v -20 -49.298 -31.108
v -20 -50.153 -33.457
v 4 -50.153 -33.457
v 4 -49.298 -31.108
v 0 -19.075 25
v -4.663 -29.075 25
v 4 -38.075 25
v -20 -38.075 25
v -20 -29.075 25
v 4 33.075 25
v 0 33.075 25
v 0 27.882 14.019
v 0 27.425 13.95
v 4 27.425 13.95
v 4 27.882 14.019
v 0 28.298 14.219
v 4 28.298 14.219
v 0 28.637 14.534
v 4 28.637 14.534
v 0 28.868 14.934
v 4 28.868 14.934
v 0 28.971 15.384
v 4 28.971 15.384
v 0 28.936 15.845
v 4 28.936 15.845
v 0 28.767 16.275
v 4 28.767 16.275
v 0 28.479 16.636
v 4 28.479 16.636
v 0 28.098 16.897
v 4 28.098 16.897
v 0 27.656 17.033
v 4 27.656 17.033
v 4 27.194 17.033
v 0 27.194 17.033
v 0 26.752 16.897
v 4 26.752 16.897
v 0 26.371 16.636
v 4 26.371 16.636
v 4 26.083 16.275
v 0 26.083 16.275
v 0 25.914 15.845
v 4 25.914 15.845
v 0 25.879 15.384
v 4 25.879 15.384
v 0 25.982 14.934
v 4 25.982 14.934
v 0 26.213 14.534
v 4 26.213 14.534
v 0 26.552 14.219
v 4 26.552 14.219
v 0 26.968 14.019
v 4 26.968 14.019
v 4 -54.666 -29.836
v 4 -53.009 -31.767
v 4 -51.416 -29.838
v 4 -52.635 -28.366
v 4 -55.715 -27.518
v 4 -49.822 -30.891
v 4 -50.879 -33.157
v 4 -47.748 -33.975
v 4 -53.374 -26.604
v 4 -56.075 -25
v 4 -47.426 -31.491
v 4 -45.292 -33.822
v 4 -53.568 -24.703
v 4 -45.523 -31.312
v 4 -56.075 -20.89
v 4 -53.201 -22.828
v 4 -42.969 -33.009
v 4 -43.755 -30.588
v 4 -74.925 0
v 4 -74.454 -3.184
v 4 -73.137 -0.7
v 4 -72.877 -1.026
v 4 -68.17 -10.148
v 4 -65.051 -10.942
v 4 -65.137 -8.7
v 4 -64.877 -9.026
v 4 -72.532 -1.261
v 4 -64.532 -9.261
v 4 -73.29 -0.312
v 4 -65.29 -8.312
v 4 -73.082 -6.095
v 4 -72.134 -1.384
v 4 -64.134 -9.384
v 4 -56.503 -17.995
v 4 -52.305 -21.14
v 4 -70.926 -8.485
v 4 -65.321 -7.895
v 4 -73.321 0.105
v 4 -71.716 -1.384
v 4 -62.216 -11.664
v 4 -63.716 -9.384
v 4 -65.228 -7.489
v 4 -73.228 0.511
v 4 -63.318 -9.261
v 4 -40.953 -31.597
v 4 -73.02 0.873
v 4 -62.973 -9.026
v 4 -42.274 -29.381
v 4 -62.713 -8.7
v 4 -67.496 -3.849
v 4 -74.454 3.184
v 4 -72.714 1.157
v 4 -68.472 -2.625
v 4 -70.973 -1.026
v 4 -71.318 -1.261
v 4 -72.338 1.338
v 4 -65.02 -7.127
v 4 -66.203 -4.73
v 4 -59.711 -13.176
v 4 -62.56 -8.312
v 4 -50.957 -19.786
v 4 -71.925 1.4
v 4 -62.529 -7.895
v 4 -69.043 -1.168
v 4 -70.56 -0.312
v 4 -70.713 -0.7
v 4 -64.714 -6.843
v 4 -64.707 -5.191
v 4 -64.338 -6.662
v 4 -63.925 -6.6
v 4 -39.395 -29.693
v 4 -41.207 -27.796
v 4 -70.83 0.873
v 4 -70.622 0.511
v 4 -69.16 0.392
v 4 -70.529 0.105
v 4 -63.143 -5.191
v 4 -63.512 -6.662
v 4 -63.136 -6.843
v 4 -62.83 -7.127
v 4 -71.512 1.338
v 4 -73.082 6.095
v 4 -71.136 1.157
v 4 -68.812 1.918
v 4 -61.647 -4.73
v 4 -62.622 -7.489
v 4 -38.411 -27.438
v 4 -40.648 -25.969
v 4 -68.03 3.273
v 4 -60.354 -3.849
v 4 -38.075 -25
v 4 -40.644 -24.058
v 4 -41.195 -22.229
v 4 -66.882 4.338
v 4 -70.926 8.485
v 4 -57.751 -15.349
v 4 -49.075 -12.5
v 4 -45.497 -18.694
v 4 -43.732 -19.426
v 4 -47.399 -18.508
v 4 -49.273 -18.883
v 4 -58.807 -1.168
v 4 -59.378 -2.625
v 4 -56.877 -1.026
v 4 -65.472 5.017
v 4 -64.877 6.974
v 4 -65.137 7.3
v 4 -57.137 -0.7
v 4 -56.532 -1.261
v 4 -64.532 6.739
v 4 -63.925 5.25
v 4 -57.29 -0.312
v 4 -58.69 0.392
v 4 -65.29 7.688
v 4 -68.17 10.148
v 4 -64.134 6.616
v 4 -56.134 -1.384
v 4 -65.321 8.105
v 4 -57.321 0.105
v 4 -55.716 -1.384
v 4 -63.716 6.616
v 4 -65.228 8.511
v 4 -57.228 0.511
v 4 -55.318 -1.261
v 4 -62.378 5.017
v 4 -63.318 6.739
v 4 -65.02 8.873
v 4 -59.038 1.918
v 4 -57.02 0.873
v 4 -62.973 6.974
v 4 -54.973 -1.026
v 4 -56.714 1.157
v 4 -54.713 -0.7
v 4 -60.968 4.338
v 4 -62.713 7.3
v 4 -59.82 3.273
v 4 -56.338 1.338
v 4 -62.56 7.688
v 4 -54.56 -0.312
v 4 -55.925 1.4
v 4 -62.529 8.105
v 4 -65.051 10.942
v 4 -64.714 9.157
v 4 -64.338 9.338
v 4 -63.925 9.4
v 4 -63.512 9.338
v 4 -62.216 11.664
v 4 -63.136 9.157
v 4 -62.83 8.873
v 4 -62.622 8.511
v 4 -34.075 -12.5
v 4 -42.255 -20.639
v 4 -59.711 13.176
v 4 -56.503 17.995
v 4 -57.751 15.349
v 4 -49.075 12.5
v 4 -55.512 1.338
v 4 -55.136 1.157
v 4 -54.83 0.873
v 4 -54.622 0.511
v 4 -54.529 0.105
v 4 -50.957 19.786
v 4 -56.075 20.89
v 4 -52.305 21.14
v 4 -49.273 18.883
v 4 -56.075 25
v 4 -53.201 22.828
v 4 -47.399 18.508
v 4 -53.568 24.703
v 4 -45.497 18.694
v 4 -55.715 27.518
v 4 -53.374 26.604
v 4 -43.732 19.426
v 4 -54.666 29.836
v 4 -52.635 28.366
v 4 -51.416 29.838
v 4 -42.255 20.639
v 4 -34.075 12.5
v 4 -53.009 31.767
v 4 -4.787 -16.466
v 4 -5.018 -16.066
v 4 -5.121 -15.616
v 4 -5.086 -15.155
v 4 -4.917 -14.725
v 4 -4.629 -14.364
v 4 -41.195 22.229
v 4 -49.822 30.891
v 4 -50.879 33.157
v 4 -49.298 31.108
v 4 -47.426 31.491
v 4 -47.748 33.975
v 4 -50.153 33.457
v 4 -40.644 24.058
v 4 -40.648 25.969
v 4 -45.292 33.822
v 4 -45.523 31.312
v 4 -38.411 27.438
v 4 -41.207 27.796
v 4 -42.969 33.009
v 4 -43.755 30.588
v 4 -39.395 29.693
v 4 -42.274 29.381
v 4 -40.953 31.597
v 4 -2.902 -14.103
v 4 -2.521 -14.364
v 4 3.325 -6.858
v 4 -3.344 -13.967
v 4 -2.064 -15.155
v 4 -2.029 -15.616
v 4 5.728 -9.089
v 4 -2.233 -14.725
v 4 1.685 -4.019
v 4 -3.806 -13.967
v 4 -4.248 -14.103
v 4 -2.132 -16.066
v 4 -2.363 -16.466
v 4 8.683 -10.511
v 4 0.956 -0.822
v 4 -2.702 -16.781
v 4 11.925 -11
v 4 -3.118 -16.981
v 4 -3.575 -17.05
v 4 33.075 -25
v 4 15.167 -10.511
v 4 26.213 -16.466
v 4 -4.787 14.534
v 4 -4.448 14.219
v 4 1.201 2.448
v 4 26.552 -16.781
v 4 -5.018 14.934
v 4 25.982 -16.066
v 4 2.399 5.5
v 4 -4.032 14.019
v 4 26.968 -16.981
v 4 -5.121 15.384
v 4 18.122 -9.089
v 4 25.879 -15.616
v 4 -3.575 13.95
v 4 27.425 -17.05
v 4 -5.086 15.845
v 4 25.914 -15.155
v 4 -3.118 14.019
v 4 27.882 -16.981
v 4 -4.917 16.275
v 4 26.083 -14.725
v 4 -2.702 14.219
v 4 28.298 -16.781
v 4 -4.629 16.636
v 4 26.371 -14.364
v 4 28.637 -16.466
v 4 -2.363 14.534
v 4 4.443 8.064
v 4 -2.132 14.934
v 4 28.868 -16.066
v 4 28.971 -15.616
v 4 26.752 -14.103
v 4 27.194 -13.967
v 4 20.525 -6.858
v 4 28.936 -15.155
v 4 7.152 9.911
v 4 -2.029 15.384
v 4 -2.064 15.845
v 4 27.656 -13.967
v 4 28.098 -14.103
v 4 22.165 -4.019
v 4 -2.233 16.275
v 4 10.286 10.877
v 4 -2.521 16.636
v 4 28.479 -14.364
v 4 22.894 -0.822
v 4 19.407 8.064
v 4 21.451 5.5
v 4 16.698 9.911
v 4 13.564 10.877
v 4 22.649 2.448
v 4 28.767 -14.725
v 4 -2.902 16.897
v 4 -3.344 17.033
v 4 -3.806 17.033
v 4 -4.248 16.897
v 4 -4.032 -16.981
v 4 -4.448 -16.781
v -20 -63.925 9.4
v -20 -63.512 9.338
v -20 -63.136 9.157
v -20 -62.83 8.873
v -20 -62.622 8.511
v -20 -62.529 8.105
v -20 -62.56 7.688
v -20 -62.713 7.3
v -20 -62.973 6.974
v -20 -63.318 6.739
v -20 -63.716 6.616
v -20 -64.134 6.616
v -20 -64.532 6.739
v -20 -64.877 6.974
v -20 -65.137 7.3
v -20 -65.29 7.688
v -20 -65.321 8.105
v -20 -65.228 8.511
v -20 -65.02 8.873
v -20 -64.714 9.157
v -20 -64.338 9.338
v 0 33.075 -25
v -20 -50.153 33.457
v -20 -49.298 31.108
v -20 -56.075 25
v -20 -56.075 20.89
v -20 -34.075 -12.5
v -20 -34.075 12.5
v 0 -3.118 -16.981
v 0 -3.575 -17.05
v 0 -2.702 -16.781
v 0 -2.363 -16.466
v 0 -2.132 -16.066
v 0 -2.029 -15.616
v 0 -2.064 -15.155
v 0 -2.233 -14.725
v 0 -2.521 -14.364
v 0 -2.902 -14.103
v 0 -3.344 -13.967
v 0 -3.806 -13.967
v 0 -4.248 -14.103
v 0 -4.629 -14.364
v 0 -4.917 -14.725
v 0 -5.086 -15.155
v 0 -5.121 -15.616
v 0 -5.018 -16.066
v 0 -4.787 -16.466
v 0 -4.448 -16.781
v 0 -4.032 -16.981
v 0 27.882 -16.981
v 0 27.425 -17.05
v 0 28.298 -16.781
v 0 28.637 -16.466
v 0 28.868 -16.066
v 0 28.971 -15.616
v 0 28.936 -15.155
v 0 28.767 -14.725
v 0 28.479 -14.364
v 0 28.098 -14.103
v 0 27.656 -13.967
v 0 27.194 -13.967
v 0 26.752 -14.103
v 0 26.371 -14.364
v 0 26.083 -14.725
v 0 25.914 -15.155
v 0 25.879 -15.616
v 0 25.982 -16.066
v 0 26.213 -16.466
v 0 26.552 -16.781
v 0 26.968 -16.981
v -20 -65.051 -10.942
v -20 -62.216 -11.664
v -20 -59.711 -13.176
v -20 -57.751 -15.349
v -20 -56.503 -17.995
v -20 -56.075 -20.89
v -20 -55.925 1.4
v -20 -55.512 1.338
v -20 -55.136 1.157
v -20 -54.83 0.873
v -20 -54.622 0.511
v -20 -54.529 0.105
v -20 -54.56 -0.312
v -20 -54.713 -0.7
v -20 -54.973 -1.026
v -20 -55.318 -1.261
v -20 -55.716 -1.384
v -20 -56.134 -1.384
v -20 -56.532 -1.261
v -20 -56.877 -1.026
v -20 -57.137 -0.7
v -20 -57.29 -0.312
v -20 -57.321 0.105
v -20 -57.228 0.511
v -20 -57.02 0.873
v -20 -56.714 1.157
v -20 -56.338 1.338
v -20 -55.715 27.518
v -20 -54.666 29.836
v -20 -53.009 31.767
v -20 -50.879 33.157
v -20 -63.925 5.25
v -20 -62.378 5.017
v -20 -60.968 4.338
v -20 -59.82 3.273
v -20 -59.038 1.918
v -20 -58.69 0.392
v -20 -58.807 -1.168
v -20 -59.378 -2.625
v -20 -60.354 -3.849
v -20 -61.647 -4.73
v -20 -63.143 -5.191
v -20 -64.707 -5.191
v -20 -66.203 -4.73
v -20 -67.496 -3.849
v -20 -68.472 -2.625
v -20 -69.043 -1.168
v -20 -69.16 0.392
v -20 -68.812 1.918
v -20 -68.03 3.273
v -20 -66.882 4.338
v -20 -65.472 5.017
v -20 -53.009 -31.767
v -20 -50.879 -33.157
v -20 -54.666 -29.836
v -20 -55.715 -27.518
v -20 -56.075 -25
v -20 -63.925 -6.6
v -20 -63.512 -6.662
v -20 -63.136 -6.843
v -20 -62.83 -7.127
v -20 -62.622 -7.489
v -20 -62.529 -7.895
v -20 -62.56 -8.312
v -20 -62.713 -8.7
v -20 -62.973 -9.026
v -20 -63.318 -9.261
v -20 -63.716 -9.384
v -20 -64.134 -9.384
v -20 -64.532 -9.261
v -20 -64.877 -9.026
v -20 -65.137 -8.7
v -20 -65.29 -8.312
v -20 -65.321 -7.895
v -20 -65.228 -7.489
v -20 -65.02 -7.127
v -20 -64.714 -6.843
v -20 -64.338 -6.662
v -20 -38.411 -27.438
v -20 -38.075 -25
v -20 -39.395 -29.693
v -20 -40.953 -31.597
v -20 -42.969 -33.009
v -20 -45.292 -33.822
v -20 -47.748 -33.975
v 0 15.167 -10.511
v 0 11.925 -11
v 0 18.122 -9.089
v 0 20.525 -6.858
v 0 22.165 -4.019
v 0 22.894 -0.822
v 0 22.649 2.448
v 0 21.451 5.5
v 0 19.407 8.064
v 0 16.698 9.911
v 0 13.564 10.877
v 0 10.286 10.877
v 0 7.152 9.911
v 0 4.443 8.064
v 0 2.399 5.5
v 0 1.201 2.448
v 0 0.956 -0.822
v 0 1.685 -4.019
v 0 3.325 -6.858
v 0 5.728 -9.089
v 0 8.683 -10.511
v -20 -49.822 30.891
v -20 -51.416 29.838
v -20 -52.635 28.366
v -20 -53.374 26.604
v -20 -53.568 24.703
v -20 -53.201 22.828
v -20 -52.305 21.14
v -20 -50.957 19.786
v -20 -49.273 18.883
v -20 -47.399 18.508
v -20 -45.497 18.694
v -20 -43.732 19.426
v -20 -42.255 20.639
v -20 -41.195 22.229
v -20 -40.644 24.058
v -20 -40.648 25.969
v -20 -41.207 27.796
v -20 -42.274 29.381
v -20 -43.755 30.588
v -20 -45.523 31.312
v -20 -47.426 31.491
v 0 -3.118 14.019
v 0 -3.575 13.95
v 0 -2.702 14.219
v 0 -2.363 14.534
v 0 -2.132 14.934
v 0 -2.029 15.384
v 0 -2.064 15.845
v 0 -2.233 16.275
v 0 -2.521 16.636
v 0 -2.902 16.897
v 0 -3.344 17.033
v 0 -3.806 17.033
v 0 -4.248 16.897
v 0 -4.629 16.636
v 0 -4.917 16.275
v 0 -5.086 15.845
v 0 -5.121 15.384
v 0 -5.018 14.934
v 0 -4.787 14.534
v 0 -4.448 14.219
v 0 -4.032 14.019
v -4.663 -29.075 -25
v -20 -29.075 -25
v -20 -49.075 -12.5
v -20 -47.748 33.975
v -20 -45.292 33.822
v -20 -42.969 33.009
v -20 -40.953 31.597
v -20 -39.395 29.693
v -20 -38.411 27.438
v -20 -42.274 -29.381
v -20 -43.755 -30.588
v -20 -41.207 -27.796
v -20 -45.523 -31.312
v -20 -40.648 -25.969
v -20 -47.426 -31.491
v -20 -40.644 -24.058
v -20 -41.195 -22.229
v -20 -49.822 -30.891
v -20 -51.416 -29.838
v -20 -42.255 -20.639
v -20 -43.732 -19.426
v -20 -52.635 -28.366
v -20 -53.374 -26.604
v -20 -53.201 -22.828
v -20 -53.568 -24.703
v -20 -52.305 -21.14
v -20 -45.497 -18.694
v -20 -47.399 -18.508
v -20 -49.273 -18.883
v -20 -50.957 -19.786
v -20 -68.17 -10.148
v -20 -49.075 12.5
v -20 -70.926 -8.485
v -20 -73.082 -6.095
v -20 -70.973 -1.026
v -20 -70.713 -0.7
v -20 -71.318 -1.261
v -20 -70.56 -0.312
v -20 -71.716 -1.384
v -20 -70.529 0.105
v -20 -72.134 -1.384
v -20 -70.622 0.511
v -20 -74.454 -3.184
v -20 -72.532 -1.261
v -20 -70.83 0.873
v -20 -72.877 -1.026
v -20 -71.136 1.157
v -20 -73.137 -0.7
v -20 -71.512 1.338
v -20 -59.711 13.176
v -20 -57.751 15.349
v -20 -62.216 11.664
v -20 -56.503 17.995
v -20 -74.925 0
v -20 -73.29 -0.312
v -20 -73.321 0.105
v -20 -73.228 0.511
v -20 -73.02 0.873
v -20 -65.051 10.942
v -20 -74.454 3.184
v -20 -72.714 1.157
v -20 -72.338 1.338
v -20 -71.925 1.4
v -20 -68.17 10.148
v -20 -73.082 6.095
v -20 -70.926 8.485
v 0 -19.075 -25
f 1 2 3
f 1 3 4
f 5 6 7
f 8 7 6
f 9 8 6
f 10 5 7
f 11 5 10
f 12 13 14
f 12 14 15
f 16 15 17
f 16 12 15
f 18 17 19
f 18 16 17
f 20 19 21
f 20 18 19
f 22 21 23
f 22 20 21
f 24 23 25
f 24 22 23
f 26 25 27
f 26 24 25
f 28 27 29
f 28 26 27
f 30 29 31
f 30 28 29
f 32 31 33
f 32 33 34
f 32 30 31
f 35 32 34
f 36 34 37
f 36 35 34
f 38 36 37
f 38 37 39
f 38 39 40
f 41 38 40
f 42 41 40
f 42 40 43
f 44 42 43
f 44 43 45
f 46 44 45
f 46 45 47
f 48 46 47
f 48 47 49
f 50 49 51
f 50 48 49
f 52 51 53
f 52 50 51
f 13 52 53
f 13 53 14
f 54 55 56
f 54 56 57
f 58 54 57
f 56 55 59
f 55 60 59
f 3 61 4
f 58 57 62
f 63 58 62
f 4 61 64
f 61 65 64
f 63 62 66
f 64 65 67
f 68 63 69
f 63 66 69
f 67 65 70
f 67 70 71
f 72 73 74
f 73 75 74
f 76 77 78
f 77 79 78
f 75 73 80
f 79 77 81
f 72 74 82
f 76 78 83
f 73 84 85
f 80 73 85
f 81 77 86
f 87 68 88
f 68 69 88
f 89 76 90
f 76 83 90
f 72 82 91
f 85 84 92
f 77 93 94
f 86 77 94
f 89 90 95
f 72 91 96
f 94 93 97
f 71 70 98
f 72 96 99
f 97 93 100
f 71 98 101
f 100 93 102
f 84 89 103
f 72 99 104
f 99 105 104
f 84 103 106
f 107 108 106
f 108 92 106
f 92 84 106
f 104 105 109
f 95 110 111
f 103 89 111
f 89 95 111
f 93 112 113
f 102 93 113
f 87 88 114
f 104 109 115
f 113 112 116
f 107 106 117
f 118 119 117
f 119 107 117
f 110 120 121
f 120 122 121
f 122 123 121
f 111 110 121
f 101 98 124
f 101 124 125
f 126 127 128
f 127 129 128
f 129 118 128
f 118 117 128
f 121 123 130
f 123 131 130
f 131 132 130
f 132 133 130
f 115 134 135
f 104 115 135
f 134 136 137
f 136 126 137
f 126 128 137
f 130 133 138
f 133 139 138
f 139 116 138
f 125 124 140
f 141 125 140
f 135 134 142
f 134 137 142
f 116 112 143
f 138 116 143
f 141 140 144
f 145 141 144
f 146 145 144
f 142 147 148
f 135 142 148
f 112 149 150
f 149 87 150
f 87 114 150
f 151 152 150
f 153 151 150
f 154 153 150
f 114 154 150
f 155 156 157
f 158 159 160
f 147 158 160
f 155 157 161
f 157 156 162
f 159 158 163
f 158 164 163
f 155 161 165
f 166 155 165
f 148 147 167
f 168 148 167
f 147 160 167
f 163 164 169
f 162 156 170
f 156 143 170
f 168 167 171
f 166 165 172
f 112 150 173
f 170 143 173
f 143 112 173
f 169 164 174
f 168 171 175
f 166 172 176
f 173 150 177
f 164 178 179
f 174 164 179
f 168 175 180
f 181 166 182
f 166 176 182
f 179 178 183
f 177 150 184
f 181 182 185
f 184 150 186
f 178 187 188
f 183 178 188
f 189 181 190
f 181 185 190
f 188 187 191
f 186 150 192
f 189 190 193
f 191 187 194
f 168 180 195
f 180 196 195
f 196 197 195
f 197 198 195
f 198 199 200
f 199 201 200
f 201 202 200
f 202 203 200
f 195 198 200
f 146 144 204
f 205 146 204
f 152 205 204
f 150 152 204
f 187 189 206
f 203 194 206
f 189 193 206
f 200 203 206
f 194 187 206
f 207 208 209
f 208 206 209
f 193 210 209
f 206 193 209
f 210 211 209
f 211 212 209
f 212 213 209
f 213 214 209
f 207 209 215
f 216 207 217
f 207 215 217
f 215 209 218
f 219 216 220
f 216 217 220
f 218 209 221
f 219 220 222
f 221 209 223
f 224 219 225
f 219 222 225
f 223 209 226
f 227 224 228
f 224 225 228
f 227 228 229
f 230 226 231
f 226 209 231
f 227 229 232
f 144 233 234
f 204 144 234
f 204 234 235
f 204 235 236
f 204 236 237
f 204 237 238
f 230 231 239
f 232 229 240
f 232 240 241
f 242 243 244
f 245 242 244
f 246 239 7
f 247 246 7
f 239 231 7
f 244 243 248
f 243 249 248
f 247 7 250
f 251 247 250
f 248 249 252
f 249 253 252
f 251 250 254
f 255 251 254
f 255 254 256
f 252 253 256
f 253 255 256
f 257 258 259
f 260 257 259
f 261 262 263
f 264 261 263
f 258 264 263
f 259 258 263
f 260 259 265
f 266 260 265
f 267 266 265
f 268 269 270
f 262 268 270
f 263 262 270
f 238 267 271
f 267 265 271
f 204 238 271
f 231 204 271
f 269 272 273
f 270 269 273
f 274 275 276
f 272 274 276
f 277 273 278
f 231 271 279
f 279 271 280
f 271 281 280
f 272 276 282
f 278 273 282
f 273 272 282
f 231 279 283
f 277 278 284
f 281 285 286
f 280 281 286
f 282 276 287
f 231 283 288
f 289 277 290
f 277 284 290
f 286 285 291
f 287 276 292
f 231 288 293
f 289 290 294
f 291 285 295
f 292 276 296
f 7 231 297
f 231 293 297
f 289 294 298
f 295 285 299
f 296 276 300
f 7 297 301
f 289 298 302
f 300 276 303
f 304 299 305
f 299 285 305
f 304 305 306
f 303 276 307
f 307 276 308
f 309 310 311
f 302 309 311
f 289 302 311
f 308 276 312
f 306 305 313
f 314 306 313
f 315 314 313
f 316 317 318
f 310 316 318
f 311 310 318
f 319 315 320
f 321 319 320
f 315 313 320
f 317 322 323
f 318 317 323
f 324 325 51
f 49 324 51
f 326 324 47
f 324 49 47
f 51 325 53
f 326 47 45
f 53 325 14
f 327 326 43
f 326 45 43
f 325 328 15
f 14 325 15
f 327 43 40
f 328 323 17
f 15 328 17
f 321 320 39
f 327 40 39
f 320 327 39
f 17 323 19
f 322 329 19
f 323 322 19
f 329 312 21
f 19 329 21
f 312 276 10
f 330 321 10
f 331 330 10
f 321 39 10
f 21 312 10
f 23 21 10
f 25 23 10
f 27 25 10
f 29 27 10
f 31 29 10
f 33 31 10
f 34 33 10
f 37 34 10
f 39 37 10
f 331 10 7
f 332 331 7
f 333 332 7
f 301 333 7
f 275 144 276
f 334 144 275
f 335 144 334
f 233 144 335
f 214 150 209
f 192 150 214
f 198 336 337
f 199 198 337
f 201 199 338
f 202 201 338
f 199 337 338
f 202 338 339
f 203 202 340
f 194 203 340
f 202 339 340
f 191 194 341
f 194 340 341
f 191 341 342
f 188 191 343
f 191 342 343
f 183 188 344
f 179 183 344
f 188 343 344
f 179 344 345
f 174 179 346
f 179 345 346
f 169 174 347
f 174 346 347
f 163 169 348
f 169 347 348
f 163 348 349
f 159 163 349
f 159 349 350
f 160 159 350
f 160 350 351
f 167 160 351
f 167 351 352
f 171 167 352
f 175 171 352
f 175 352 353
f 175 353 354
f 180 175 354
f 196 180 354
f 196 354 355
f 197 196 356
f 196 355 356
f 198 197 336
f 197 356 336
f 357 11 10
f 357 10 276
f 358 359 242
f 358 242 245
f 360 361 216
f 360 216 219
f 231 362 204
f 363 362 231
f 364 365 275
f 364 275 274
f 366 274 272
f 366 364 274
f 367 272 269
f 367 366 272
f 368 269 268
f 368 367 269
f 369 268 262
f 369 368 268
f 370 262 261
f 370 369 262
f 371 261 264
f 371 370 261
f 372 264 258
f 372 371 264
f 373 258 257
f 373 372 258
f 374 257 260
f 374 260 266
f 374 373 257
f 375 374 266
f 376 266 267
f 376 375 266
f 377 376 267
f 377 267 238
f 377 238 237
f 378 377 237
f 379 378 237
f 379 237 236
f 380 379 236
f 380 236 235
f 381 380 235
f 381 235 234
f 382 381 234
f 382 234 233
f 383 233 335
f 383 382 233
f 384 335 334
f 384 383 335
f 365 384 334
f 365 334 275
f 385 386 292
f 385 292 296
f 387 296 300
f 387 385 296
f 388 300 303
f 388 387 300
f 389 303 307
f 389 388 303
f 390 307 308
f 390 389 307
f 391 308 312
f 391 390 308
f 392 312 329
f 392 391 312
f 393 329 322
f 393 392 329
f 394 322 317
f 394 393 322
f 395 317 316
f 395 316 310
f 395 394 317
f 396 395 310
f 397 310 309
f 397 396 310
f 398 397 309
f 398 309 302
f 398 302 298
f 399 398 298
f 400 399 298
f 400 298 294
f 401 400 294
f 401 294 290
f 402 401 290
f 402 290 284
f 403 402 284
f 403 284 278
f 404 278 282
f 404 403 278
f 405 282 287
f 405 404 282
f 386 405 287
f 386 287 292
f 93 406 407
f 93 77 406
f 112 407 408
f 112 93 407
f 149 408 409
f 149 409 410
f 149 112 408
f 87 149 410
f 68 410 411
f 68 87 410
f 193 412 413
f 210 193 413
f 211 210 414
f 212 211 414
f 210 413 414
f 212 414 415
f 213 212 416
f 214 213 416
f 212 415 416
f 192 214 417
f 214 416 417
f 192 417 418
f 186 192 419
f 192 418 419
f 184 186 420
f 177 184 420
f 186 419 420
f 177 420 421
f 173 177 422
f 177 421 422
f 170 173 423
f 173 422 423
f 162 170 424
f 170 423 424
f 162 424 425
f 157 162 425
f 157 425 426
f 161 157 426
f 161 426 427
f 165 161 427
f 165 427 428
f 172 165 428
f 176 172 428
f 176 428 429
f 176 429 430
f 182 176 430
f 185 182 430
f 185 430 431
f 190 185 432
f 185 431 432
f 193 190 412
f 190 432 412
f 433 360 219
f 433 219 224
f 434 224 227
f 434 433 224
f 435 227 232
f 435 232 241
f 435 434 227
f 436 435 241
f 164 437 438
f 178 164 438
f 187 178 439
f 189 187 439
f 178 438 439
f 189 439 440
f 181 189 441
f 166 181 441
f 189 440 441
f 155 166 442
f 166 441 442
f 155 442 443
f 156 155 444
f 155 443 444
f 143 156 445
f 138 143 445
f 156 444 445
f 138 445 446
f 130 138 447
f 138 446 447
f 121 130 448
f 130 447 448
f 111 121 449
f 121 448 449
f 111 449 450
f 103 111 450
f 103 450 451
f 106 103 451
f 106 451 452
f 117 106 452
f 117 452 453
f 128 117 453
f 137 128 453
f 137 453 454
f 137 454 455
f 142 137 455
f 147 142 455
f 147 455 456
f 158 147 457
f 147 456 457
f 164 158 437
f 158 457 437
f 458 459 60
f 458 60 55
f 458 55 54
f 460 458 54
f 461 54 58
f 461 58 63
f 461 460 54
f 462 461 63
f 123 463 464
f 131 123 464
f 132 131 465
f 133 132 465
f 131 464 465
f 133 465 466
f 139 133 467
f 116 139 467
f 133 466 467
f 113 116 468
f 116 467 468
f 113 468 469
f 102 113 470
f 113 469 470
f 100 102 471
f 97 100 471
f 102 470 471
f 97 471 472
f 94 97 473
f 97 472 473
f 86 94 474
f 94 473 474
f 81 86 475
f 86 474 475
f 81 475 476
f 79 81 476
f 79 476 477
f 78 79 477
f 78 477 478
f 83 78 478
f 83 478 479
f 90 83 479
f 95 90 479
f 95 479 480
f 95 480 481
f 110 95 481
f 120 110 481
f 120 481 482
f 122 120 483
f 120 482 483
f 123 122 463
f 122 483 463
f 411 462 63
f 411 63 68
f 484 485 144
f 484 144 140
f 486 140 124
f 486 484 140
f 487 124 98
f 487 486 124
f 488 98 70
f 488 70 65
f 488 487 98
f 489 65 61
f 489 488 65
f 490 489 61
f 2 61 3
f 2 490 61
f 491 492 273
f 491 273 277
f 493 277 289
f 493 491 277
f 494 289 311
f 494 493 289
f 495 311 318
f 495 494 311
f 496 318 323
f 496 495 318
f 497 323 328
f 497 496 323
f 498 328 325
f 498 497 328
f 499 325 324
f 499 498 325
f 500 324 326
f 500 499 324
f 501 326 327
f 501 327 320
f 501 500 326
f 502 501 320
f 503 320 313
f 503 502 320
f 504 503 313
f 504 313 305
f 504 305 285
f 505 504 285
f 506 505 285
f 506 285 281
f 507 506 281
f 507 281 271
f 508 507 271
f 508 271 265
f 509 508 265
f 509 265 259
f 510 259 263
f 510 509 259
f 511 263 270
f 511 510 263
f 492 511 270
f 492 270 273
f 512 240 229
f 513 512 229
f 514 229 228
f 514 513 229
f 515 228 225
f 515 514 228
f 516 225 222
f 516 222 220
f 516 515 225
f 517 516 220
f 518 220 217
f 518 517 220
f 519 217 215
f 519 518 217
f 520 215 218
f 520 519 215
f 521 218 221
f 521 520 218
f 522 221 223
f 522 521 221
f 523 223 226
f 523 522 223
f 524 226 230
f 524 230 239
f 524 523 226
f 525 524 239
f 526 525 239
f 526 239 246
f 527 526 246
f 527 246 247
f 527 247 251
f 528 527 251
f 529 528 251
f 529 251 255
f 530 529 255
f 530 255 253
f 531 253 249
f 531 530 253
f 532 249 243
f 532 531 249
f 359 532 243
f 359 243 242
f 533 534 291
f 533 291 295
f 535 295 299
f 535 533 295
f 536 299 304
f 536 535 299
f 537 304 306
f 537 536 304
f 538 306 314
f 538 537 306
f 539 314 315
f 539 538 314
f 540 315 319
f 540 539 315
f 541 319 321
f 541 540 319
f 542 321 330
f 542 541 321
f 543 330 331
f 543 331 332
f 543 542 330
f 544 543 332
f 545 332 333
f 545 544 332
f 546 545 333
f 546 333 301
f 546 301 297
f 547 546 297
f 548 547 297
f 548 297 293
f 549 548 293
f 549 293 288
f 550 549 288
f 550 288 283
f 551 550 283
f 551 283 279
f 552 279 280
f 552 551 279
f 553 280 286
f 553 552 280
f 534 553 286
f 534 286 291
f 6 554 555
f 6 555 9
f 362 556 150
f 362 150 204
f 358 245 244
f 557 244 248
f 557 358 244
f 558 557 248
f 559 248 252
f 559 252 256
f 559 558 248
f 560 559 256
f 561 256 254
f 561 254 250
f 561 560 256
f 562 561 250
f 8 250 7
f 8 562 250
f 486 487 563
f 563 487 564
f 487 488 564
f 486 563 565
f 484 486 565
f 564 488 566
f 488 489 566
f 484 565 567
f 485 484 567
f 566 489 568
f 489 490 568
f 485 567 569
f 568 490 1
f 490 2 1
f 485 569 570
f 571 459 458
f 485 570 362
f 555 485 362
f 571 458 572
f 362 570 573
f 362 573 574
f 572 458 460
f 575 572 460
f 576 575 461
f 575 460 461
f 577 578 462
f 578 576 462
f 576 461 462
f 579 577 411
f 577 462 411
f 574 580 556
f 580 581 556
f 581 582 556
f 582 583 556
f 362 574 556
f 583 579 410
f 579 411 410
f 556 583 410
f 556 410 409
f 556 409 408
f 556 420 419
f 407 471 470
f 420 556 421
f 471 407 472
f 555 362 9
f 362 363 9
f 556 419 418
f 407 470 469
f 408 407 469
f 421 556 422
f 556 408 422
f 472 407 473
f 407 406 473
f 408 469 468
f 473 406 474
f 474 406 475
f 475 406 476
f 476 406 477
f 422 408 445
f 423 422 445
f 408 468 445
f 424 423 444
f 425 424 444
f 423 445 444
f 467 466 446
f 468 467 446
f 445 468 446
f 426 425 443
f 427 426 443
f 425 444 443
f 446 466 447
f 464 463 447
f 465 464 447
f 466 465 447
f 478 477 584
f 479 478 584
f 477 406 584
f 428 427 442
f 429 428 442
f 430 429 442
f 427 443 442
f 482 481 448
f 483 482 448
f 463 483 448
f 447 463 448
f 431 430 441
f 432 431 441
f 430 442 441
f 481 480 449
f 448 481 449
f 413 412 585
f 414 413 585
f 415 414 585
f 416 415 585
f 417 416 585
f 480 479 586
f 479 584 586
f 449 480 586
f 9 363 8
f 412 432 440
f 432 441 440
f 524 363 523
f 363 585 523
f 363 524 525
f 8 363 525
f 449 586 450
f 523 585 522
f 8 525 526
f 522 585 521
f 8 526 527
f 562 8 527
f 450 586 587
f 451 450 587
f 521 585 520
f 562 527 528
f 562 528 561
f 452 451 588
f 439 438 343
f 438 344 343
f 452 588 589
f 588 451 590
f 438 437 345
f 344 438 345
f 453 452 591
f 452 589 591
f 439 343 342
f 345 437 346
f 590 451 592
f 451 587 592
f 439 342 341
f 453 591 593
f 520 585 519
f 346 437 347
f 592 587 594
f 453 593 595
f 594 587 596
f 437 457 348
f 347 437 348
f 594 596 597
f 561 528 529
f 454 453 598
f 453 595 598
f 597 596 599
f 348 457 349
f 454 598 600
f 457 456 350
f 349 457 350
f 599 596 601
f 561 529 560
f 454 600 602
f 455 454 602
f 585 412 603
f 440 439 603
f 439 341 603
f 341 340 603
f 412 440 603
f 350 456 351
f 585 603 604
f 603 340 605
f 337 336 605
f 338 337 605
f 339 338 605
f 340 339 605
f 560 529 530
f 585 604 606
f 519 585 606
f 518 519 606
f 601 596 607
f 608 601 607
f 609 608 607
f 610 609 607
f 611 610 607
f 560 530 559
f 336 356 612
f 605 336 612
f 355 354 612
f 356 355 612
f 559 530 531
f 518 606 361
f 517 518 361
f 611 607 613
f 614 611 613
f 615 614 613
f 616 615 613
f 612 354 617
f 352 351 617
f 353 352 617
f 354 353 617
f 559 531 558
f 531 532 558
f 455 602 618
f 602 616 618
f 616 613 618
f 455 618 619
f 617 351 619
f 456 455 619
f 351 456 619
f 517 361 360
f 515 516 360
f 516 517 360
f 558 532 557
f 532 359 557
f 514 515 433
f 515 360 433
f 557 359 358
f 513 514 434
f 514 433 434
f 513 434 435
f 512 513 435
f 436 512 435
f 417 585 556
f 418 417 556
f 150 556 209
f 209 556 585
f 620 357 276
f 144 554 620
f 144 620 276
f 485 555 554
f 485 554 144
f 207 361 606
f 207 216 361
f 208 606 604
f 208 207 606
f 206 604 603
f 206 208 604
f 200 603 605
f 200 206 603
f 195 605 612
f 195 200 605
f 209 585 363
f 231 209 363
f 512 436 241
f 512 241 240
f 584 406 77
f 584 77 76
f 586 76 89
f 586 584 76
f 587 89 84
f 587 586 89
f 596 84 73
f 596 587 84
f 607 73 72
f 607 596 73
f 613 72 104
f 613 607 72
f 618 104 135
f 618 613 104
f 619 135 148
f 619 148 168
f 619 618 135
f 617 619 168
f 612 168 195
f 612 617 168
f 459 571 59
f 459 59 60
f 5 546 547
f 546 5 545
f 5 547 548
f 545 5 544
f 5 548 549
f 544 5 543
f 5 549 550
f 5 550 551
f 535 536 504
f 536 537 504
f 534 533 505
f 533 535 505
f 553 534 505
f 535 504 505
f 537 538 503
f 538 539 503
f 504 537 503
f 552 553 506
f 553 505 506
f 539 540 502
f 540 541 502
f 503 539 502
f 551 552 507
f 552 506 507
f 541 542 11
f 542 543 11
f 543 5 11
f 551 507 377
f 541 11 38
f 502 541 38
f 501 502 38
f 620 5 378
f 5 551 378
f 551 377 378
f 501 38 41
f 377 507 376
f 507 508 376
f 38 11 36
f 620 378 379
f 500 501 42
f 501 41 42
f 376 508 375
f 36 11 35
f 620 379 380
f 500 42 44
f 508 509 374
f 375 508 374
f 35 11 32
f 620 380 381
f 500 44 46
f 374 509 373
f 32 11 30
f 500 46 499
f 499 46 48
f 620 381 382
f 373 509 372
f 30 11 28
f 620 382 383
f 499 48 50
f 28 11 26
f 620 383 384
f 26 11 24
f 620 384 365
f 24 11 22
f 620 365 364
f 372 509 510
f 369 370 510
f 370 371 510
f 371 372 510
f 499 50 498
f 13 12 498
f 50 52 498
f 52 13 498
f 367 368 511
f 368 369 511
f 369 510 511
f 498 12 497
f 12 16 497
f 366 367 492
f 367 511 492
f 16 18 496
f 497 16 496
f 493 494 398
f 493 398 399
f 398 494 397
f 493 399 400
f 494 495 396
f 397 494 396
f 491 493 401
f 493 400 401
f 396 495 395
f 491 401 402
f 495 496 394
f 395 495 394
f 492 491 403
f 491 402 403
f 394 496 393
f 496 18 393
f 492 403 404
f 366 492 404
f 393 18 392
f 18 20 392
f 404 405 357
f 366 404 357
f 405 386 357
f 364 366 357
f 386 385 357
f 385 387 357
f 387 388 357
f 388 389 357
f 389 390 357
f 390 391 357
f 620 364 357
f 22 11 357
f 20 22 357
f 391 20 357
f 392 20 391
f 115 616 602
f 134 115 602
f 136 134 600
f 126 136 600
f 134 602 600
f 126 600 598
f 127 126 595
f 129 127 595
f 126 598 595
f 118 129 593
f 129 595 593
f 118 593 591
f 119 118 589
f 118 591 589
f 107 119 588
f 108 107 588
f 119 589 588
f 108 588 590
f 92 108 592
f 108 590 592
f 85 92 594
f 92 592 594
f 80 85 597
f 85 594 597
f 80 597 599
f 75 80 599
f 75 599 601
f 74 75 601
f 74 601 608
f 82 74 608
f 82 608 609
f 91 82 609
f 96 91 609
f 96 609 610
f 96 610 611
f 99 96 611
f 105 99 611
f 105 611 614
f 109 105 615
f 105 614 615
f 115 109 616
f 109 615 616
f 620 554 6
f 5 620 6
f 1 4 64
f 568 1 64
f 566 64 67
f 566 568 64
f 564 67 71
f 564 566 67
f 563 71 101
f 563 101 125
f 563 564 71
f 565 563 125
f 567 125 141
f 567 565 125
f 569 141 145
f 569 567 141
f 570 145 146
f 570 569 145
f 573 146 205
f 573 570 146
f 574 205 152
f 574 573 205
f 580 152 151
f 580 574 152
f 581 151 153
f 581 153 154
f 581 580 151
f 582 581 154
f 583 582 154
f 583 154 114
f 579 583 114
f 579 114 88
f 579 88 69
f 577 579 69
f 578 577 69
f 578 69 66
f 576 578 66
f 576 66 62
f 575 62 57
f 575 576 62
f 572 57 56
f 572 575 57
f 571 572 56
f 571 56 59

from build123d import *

# Parameters (mm, degrees)
SKETCH1_W           = 50
SKETCH1_H           = 66.15
SKETCH1_R           = 11
SKETCH1_R_2         = 1.55
BOSS_EXTRUDE1_DEPTH = 4
SKETCH2_W           = 50
SKETCH2_H           = 4
BOSS_EXTRUDE2_DEPTH = 38
CHAMFER1_SIZE       = 10
CHAMFER1_SIZE2      = 4.663076582
BOSS_EXTRUDE3_START = -18
SKETCH3_R           = 5.25
SKETCH3_R_2         = 1.4
BOSS_EXTRUDE3_DEPTH = 24
SKETCH4_W           = 18
SKETCH4_H           = 50
CUT_EXTRUDE1_DEPTH  = 24
FILLET1_R           = 10
SKETCH5_W           = 25
SKETCH5_H           = 15
CUT_EXTRUDE2_DEPTH  = 86.707383725


with BuildPart() as part:
    # Sketch1 → Boss-Extrude1 (new body)
    with BuildSketch(Plane(origin=(0, 0, 0), x_dir=(0, 0, -1), z_dir=(1, 0, 0))):
        Rectangle(SKETCH1_W, SKETCH1_H)
        with Locations((0, 11.925)):
            Circle(SKETCH1_R, mode=Mode.SUBTRACT)
        with Locations((-15.5, 27.425)):
            Circle(SKETCH1_R_2, mode=Mode.SUBTRACT)
        with Locations((15.5, 27.425)):
            Circle(SKETCH1_R_2, mode=Mode.SUBTRACT)
        with Locations((15.5, -3.575)):
            Circle(SKETCH1_R_2, mode=Mode.SUBTRACT)
        with Locations((-15.5, -3.575)):
            Circle(SKETCH1_R_2, mode=Mode.SUBTRACT)
    extrude(amount=BOSS_EXTRUDE1_DEPTH)

    # Sketch2 → Boss-Extrude2 (add)
    with BuildSketch(Plane.ZY):
        with Locations((0, -31.075)):
            Rectangle(SKETCH2_W, SKETCH2_H)
    extrude(amount=BOSS_EXTRUDE2_DEPTH)

    # Chamfer1
    chamfer1_edges = [part.edges().sort_by_distance(p)[0] for p in [
        (0, -29.075, 0),
    ]]
    chamfer1_side = [part.faces().sort_by_distance(p)[0] for p in [
        (0, 0.490102601, 0),
    ]]
    chamfer(chamfer1_edges, length=CHAMFER1_SIZE, length2=CHAMFER1_SIZE2, reference=chamfer1_side[0])

    # Sketch3 → Boss-Extrude3 (add)
    with BuildSketch(Plane.ZY.offset(38).offset(BOSS_EXTRUDE3_START)):
        with BuildLine():
            Line((-25, -33.075), (-25, -38.075))
            ThreePointArc((-25, -38.075), (-32.372368399, -41.912812073), (-33.457233587, -50.15318129))
            Line((-33.457233587, -50.15318129), (-31.108002035, -49.298130932))
            ThreePointArc((-31.108002035, -49.298130932), (-18.994783039, -44.58755769), (-30.891000616, -49.822018701))
            Line((-30.891000616, -49.822018701), (-33.156770083, -50.878564356))
            ThreePointArc((-33.156770083, -50.878564356), (-29.835696475, -54.665523012), (-25, -56.075))
            Line((-25, -56.075), (-7.705679723, -56.075))
            ThreePointArc((-7.705679723, -56.075), (0, -74.925), (7.705679723, -56.075))
            Line((7.705679723, -56.075), (25, -56.075))
            ThreePointArc((25, -56.075), (29.835696475, -54.665523012), (33.156770083, -50.878564356))
            Line((33.156770083, -50.878564356), (30.891000616, -49.822018701))
            ThreePointArc((30.891000616, -49.822018701), (18.994783039, -44.58755769), (31.108002035, -49.298130932))
            Line((31.108002035, -49.298130932), (33.457233587, -50.15318129))
            ThreePointArc((33.457233587, -50.15318129), (32.372368399, -41.912812073), (25, -38.075))
            Line((25, -38.075), (25, -33.075))
            Line((25, -33.075), (-25, -33.075))
        make_face()
        with Locations((0, -63.925)):
            Circle(SKETCH3_R, mode=Mode.SUBTRACT)
        with Locations((0, -55.925)):
            Circle(SKETCH3_R_2, mode=Mode.SUBTRACT)
        with Locations((-8, -63.925)):
            Circle(SKETCH3_R_2, mode=Mode.SUBTRACT)
        with Locations((0, -71.925)):
            Circle(SKETCH3_R_2, mode=Mode.SUBTRACT)
        with Locations((8, -63.925)):
            Circle(SKETCH3_R_2, mode=Mode.SUBTRACT)
    extrude(amount=-BOSS_EXTRUDE3_DEPTH)

    # Sketch4 → Cut-Extrude1 (cut)
    with BuildSketch(Plane.XZ.offset(33.075)):
        with Locations((-29, 0)):
            Rectangle(SKETCH4_W, SKETCH4_H)
    extrude(amount=-CUT_EXTRUDE1_DEPTH, mode=Mode.SUBTRACT)

    # Fillet1
    fillet1_edges = [part.edges().sort_by_distance(p)[0] for p in [
        (-8, -56.075, -7.705679723),
        (-8, -56.075, 7.705679723),
    ]]
    fillet(fillet1_edges, radius=FILLET1_R)

    # Sketch5 → Cut-Extrude2 (cut, through all)
    with BuildSketch(Plane.ZY.offset(20)):
        with Locations((0, -41.575)):
            Rectangle(SKETCH5_W, SKETCH5_H)
    extrude(amount=-CUT_EXTRUDE2_DEPTH, mode=Mode.SUBTRACT)


solid = part.part
